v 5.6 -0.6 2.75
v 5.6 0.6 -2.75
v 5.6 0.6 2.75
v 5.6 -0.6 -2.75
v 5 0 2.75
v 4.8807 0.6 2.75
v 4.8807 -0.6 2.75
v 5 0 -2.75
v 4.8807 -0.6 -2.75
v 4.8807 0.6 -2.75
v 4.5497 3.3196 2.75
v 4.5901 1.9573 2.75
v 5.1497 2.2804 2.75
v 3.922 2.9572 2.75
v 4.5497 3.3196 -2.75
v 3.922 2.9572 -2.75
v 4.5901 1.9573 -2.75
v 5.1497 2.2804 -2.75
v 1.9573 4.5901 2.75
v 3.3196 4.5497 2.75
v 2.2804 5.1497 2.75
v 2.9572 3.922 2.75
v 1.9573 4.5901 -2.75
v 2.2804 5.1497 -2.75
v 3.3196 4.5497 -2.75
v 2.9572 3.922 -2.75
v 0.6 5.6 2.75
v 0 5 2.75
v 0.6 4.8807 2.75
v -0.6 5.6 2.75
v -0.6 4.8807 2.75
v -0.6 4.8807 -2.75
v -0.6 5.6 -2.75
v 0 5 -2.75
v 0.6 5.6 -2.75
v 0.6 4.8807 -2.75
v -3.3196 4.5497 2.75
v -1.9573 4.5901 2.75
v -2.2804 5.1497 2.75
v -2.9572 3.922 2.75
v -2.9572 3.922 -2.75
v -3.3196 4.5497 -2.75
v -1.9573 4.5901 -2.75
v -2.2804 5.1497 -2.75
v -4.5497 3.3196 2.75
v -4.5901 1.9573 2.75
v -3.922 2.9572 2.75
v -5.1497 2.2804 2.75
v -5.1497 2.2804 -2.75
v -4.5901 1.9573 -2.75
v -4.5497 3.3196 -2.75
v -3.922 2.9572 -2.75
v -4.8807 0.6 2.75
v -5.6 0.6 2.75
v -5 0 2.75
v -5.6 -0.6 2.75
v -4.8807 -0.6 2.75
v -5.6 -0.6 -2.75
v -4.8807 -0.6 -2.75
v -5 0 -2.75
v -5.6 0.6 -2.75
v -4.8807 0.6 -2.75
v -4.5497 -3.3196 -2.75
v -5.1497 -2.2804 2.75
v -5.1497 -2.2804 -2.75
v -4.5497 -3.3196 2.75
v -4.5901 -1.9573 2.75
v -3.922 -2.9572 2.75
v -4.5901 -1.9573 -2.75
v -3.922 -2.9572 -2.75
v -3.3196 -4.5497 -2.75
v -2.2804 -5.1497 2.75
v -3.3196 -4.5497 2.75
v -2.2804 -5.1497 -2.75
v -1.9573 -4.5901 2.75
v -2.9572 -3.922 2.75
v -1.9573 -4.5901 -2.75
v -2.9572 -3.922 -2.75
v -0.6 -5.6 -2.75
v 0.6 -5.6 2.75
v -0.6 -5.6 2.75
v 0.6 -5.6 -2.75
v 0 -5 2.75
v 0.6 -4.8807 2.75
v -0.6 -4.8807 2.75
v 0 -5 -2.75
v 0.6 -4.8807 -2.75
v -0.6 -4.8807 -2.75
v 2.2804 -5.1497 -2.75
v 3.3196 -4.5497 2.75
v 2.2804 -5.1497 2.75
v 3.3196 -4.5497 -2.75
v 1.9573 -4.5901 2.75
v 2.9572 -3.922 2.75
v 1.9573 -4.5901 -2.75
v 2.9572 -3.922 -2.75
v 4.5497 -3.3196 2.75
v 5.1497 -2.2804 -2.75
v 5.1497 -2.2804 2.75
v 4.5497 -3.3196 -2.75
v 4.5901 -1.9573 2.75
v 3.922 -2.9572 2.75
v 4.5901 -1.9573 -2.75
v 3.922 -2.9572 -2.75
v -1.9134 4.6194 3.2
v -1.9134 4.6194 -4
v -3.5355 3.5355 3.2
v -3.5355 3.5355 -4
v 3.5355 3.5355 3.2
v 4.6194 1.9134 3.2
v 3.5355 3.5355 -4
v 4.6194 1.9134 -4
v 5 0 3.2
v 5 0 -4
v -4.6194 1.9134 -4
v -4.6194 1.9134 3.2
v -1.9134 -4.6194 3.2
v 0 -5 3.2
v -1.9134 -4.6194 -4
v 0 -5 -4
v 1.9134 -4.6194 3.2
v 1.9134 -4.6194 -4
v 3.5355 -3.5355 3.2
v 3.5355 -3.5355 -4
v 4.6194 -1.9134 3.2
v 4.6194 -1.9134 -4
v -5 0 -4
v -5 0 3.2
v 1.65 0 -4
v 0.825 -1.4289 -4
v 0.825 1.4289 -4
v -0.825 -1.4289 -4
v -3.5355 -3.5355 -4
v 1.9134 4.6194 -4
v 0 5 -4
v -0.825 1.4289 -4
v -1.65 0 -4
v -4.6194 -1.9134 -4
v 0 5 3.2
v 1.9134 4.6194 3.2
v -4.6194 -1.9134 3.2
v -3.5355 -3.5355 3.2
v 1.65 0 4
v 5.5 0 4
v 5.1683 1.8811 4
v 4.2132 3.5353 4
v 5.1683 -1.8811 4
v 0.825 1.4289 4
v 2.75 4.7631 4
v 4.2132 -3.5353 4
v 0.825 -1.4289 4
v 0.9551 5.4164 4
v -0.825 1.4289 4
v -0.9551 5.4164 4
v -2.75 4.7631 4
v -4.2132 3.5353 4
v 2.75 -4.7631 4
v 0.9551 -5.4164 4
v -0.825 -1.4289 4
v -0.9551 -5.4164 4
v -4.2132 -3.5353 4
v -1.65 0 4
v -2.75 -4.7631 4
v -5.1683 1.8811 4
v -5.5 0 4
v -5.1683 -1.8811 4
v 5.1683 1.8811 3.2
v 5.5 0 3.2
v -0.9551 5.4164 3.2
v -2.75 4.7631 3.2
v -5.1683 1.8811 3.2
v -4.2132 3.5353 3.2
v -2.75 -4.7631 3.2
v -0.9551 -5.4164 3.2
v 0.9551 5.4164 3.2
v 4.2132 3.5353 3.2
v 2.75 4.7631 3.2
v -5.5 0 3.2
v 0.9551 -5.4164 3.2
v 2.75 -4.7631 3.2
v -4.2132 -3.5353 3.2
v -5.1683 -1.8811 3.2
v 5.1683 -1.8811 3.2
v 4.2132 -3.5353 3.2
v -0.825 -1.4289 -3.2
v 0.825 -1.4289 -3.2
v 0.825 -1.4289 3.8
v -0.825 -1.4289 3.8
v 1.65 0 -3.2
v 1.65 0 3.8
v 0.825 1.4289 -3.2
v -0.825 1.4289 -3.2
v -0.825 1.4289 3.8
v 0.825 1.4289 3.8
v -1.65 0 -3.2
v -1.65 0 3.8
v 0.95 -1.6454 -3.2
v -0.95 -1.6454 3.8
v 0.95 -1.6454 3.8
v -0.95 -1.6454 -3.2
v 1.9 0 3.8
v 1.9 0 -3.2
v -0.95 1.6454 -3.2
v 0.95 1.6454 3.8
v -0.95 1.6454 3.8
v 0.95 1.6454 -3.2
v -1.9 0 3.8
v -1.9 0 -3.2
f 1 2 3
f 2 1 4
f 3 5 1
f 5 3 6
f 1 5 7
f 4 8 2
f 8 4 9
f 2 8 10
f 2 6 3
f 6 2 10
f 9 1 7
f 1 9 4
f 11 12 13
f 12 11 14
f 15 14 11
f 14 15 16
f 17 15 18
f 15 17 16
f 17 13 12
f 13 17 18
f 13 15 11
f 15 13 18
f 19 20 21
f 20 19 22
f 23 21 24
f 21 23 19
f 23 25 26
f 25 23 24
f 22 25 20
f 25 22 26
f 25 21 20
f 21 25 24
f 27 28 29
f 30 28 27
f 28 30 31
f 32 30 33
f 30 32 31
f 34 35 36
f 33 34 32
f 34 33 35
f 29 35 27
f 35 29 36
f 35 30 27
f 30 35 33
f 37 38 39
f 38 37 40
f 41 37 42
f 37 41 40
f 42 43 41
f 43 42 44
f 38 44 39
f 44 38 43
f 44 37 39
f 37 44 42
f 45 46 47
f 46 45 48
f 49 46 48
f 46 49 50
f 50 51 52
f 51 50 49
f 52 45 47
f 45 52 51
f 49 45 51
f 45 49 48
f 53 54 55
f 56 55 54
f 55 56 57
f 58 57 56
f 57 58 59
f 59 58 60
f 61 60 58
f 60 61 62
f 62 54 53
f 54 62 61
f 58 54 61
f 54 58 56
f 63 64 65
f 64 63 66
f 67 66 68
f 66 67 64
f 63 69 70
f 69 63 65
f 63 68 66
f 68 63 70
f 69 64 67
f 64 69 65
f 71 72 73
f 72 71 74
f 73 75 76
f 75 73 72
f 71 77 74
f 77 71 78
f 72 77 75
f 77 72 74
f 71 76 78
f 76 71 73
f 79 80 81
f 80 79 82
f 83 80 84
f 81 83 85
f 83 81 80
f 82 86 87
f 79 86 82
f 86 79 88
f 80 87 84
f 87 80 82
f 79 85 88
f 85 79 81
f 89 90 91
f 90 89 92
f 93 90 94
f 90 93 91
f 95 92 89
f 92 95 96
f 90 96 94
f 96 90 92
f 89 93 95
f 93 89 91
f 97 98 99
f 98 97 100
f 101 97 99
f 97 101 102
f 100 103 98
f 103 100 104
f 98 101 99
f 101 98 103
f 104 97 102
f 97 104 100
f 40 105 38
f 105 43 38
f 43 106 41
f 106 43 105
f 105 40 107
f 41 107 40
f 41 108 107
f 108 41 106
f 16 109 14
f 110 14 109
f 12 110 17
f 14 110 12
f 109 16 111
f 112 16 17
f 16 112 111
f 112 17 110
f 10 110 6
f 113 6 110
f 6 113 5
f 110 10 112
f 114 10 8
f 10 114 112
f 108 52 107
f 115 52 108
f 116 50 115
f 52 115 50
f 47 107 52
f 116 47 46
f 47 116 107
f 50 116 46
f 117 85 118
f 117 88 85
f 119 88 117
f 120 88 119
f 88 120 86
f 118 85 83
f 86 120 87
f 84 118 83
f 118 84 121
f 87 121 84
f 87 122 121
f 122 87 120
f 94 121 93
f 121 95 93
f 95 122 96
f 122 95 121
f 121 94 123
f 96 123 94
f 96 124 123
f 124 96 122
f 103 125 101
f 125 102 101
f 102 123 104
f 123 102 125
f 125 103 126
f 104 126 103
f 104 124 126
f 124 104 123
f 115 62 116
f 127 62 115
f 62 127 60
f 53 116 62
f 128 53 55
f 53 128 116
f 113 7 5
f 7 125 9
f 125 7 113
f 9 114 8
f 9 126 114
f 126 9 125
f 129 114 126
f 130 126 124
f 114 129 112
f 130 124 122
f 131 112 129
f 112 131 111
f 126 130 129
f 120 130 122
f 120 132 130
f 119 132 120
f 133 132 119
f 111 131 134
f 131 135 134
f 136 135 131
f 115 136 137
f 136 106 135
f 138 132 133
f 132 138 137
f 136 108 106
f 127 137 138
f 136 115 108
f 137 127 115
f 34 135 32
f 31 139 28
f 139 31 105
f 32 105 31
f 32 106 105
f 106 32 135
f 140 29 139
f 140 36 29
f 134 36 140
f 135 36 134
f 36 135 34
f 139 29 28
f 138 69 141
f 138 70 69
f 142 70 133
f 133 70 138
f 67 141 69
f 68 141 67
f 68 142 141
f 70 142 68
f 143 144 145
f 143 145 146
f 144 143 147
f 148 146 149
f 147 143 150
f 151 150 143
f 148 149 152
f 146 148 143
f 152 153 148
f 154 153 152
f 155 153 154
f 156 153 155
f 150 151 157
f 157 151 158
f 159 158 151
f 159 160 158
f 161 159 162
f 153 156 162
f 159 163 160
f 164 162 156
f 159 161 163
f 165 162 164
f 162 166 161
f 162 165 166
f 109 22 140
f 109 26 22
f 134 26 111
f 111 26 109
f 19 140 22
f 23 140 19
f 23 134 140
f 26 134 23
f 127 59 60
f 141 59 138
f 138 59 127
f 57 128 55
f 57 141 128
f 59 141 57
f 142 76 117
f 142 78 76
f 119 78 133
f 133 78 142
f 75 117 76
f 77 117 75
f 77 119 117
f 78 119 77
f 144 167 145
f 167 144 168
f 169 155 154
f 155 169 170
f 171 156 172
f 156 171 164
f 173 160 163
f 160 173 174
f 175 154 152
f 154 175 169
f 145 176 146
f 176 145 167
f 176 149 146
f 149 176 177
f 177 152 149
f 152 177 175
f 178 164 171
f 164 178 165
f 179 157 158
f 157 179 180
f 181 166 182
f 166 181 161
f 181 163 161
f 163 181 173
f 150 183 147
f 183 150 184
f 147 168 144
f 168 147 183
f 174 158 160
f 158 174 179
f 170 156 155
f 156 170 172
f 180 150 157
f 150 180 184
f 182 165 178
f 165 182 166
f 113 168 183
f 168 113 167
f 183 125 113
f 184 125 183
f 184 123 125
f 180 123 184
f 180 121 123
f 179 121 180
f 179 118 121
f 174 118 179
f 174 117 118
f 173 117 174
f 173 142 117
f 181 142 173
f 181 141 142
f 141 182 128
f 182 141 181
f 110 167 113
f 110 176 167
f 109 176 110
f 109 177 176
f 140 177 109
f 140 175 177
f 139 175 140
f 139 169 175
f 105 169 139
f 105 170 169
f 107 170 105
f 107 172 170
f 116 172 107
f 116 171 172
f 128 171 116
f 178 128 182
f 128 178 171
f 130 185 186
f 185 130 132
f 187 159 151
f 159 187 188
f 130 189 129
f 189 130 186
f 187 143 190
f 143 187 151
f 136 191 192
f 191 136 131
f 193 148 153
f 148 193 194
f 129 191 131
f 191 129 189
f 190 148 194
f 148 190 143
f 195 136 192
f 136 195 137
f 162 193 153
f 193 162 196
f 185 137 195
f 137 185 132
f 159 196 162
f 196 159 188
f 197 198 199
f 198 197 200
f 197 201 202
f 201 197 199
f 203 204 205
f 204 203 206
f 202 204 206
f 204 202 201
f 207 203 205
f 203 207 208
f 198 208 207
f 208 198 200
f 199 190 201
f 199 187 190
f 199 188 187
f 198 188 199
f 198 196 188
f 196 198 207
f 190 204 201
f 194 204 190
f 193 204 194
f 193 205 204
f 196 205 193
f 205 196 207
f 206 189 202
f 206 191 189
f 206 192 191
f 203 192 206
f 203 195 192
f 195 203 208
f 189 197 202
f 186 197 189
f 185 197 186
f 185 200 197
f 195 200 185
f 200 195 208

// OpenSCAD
// Parameters
od = 10.0; //[5.0:20.0:0.1]
L = 8.0; //[4.0:16.0:0.1]
id_tap_M4 = 3.3; //[2.0:4.0:0.05]
id_clear_M4 = 4.3; //[4.0:5.5:0.05]
thread_pitch_M4 = 0.7; //[0.5:1.0:0.05]
thread_length = 7.0; //[4.0:8.0:0.1]
chamfer = 0.5; //[0.2:1.5:0.05]
overlap = 0.8; //[0.5:2.0:0.1]
flange_od = 11.0; //[10.0:22.0:0.1]
flange_thk = 0.8; //[0.4:2.0:0.05]
barb_count = 12; //[6:24:1]
barb_radial = 0.6; //[0.2:1.5:0.05]
barb_width = 1.2; //[0.6:3.0:0.1]
barb_height = 5.5; //[2.0:8.0:0.1]
thread_hint_depth = 0.25; //[0.0:0.6:0.05]

// Base shapes
module insert_body() {
  cylinder(h=L, r=od/2, center=true);
}

module installation_flange() {
  translate([0, 0, L/2 + flange_thk/2 - overlap])
    cylinder(h=flange_thk, r=flange_od/2, center=true);
}

module internal_thread_bore() {
  cylinder(h=L + 2*overlap, r=id_tap_M4/2, center=true);
}

module lead_in_chamfer_top() {
  translate([0, 0, L/2 - chamfer/2 + overlap/2])
    rotate([180, 0, 0])
    cylinder(h=chamfer, r1=id_tap_M4/2 + chamfer, r2=0, center=true);
}

module lead_in_chamfer_bottom() {
  translate([0, 0, -L/2 + chamfer/2 - overlap/2])
    cylinder(h=chamfer, r1=id_tap_M4/2 + chamfer, r2=0, center=true);
}

module internal_thread_profile() {
  translate([0, 0, (-L/2) + thread_length/2 + overlap])
    cylinder(h=thread_length, r=id_tap_M4/2 + thread_hint_depth, center=true);
}

module external_barb(angle) {
  rotate([0, 0, angle])
    translate([od/2 + (barb_radial + overlap)/2 - overlap, 0, 0])
    cube([barb_radial + overlap, barb_width, barb_height], center=true);
}

module external_knurling_or_barbs() {
  union() {
    for (i = [0:barb_count-1]) {
      external_barb(i*360/barb_count);
    }
  }
}

// Operations
module insert_outer_union() {
  union() {
    insert_body();
    installation_flange();
    external_knurling_or_barbs();
  }
}

module lead_in_chamfers() {
  union() {
    lead_in_chamfer_top();
    lead_in_chamfer_bottom();
  }
}

module internal_voids_union() {
  union() {
    internal_thread_bore();
    lead_in_chamfers();
    internal_thread_profile();
  }
}

// Final model
module complete_insert_model() {
  difference() {
    insert_outer_union();
    internal_voids_union();
  }
}

// Render the final model
color("Gold") complete_insert_model();
